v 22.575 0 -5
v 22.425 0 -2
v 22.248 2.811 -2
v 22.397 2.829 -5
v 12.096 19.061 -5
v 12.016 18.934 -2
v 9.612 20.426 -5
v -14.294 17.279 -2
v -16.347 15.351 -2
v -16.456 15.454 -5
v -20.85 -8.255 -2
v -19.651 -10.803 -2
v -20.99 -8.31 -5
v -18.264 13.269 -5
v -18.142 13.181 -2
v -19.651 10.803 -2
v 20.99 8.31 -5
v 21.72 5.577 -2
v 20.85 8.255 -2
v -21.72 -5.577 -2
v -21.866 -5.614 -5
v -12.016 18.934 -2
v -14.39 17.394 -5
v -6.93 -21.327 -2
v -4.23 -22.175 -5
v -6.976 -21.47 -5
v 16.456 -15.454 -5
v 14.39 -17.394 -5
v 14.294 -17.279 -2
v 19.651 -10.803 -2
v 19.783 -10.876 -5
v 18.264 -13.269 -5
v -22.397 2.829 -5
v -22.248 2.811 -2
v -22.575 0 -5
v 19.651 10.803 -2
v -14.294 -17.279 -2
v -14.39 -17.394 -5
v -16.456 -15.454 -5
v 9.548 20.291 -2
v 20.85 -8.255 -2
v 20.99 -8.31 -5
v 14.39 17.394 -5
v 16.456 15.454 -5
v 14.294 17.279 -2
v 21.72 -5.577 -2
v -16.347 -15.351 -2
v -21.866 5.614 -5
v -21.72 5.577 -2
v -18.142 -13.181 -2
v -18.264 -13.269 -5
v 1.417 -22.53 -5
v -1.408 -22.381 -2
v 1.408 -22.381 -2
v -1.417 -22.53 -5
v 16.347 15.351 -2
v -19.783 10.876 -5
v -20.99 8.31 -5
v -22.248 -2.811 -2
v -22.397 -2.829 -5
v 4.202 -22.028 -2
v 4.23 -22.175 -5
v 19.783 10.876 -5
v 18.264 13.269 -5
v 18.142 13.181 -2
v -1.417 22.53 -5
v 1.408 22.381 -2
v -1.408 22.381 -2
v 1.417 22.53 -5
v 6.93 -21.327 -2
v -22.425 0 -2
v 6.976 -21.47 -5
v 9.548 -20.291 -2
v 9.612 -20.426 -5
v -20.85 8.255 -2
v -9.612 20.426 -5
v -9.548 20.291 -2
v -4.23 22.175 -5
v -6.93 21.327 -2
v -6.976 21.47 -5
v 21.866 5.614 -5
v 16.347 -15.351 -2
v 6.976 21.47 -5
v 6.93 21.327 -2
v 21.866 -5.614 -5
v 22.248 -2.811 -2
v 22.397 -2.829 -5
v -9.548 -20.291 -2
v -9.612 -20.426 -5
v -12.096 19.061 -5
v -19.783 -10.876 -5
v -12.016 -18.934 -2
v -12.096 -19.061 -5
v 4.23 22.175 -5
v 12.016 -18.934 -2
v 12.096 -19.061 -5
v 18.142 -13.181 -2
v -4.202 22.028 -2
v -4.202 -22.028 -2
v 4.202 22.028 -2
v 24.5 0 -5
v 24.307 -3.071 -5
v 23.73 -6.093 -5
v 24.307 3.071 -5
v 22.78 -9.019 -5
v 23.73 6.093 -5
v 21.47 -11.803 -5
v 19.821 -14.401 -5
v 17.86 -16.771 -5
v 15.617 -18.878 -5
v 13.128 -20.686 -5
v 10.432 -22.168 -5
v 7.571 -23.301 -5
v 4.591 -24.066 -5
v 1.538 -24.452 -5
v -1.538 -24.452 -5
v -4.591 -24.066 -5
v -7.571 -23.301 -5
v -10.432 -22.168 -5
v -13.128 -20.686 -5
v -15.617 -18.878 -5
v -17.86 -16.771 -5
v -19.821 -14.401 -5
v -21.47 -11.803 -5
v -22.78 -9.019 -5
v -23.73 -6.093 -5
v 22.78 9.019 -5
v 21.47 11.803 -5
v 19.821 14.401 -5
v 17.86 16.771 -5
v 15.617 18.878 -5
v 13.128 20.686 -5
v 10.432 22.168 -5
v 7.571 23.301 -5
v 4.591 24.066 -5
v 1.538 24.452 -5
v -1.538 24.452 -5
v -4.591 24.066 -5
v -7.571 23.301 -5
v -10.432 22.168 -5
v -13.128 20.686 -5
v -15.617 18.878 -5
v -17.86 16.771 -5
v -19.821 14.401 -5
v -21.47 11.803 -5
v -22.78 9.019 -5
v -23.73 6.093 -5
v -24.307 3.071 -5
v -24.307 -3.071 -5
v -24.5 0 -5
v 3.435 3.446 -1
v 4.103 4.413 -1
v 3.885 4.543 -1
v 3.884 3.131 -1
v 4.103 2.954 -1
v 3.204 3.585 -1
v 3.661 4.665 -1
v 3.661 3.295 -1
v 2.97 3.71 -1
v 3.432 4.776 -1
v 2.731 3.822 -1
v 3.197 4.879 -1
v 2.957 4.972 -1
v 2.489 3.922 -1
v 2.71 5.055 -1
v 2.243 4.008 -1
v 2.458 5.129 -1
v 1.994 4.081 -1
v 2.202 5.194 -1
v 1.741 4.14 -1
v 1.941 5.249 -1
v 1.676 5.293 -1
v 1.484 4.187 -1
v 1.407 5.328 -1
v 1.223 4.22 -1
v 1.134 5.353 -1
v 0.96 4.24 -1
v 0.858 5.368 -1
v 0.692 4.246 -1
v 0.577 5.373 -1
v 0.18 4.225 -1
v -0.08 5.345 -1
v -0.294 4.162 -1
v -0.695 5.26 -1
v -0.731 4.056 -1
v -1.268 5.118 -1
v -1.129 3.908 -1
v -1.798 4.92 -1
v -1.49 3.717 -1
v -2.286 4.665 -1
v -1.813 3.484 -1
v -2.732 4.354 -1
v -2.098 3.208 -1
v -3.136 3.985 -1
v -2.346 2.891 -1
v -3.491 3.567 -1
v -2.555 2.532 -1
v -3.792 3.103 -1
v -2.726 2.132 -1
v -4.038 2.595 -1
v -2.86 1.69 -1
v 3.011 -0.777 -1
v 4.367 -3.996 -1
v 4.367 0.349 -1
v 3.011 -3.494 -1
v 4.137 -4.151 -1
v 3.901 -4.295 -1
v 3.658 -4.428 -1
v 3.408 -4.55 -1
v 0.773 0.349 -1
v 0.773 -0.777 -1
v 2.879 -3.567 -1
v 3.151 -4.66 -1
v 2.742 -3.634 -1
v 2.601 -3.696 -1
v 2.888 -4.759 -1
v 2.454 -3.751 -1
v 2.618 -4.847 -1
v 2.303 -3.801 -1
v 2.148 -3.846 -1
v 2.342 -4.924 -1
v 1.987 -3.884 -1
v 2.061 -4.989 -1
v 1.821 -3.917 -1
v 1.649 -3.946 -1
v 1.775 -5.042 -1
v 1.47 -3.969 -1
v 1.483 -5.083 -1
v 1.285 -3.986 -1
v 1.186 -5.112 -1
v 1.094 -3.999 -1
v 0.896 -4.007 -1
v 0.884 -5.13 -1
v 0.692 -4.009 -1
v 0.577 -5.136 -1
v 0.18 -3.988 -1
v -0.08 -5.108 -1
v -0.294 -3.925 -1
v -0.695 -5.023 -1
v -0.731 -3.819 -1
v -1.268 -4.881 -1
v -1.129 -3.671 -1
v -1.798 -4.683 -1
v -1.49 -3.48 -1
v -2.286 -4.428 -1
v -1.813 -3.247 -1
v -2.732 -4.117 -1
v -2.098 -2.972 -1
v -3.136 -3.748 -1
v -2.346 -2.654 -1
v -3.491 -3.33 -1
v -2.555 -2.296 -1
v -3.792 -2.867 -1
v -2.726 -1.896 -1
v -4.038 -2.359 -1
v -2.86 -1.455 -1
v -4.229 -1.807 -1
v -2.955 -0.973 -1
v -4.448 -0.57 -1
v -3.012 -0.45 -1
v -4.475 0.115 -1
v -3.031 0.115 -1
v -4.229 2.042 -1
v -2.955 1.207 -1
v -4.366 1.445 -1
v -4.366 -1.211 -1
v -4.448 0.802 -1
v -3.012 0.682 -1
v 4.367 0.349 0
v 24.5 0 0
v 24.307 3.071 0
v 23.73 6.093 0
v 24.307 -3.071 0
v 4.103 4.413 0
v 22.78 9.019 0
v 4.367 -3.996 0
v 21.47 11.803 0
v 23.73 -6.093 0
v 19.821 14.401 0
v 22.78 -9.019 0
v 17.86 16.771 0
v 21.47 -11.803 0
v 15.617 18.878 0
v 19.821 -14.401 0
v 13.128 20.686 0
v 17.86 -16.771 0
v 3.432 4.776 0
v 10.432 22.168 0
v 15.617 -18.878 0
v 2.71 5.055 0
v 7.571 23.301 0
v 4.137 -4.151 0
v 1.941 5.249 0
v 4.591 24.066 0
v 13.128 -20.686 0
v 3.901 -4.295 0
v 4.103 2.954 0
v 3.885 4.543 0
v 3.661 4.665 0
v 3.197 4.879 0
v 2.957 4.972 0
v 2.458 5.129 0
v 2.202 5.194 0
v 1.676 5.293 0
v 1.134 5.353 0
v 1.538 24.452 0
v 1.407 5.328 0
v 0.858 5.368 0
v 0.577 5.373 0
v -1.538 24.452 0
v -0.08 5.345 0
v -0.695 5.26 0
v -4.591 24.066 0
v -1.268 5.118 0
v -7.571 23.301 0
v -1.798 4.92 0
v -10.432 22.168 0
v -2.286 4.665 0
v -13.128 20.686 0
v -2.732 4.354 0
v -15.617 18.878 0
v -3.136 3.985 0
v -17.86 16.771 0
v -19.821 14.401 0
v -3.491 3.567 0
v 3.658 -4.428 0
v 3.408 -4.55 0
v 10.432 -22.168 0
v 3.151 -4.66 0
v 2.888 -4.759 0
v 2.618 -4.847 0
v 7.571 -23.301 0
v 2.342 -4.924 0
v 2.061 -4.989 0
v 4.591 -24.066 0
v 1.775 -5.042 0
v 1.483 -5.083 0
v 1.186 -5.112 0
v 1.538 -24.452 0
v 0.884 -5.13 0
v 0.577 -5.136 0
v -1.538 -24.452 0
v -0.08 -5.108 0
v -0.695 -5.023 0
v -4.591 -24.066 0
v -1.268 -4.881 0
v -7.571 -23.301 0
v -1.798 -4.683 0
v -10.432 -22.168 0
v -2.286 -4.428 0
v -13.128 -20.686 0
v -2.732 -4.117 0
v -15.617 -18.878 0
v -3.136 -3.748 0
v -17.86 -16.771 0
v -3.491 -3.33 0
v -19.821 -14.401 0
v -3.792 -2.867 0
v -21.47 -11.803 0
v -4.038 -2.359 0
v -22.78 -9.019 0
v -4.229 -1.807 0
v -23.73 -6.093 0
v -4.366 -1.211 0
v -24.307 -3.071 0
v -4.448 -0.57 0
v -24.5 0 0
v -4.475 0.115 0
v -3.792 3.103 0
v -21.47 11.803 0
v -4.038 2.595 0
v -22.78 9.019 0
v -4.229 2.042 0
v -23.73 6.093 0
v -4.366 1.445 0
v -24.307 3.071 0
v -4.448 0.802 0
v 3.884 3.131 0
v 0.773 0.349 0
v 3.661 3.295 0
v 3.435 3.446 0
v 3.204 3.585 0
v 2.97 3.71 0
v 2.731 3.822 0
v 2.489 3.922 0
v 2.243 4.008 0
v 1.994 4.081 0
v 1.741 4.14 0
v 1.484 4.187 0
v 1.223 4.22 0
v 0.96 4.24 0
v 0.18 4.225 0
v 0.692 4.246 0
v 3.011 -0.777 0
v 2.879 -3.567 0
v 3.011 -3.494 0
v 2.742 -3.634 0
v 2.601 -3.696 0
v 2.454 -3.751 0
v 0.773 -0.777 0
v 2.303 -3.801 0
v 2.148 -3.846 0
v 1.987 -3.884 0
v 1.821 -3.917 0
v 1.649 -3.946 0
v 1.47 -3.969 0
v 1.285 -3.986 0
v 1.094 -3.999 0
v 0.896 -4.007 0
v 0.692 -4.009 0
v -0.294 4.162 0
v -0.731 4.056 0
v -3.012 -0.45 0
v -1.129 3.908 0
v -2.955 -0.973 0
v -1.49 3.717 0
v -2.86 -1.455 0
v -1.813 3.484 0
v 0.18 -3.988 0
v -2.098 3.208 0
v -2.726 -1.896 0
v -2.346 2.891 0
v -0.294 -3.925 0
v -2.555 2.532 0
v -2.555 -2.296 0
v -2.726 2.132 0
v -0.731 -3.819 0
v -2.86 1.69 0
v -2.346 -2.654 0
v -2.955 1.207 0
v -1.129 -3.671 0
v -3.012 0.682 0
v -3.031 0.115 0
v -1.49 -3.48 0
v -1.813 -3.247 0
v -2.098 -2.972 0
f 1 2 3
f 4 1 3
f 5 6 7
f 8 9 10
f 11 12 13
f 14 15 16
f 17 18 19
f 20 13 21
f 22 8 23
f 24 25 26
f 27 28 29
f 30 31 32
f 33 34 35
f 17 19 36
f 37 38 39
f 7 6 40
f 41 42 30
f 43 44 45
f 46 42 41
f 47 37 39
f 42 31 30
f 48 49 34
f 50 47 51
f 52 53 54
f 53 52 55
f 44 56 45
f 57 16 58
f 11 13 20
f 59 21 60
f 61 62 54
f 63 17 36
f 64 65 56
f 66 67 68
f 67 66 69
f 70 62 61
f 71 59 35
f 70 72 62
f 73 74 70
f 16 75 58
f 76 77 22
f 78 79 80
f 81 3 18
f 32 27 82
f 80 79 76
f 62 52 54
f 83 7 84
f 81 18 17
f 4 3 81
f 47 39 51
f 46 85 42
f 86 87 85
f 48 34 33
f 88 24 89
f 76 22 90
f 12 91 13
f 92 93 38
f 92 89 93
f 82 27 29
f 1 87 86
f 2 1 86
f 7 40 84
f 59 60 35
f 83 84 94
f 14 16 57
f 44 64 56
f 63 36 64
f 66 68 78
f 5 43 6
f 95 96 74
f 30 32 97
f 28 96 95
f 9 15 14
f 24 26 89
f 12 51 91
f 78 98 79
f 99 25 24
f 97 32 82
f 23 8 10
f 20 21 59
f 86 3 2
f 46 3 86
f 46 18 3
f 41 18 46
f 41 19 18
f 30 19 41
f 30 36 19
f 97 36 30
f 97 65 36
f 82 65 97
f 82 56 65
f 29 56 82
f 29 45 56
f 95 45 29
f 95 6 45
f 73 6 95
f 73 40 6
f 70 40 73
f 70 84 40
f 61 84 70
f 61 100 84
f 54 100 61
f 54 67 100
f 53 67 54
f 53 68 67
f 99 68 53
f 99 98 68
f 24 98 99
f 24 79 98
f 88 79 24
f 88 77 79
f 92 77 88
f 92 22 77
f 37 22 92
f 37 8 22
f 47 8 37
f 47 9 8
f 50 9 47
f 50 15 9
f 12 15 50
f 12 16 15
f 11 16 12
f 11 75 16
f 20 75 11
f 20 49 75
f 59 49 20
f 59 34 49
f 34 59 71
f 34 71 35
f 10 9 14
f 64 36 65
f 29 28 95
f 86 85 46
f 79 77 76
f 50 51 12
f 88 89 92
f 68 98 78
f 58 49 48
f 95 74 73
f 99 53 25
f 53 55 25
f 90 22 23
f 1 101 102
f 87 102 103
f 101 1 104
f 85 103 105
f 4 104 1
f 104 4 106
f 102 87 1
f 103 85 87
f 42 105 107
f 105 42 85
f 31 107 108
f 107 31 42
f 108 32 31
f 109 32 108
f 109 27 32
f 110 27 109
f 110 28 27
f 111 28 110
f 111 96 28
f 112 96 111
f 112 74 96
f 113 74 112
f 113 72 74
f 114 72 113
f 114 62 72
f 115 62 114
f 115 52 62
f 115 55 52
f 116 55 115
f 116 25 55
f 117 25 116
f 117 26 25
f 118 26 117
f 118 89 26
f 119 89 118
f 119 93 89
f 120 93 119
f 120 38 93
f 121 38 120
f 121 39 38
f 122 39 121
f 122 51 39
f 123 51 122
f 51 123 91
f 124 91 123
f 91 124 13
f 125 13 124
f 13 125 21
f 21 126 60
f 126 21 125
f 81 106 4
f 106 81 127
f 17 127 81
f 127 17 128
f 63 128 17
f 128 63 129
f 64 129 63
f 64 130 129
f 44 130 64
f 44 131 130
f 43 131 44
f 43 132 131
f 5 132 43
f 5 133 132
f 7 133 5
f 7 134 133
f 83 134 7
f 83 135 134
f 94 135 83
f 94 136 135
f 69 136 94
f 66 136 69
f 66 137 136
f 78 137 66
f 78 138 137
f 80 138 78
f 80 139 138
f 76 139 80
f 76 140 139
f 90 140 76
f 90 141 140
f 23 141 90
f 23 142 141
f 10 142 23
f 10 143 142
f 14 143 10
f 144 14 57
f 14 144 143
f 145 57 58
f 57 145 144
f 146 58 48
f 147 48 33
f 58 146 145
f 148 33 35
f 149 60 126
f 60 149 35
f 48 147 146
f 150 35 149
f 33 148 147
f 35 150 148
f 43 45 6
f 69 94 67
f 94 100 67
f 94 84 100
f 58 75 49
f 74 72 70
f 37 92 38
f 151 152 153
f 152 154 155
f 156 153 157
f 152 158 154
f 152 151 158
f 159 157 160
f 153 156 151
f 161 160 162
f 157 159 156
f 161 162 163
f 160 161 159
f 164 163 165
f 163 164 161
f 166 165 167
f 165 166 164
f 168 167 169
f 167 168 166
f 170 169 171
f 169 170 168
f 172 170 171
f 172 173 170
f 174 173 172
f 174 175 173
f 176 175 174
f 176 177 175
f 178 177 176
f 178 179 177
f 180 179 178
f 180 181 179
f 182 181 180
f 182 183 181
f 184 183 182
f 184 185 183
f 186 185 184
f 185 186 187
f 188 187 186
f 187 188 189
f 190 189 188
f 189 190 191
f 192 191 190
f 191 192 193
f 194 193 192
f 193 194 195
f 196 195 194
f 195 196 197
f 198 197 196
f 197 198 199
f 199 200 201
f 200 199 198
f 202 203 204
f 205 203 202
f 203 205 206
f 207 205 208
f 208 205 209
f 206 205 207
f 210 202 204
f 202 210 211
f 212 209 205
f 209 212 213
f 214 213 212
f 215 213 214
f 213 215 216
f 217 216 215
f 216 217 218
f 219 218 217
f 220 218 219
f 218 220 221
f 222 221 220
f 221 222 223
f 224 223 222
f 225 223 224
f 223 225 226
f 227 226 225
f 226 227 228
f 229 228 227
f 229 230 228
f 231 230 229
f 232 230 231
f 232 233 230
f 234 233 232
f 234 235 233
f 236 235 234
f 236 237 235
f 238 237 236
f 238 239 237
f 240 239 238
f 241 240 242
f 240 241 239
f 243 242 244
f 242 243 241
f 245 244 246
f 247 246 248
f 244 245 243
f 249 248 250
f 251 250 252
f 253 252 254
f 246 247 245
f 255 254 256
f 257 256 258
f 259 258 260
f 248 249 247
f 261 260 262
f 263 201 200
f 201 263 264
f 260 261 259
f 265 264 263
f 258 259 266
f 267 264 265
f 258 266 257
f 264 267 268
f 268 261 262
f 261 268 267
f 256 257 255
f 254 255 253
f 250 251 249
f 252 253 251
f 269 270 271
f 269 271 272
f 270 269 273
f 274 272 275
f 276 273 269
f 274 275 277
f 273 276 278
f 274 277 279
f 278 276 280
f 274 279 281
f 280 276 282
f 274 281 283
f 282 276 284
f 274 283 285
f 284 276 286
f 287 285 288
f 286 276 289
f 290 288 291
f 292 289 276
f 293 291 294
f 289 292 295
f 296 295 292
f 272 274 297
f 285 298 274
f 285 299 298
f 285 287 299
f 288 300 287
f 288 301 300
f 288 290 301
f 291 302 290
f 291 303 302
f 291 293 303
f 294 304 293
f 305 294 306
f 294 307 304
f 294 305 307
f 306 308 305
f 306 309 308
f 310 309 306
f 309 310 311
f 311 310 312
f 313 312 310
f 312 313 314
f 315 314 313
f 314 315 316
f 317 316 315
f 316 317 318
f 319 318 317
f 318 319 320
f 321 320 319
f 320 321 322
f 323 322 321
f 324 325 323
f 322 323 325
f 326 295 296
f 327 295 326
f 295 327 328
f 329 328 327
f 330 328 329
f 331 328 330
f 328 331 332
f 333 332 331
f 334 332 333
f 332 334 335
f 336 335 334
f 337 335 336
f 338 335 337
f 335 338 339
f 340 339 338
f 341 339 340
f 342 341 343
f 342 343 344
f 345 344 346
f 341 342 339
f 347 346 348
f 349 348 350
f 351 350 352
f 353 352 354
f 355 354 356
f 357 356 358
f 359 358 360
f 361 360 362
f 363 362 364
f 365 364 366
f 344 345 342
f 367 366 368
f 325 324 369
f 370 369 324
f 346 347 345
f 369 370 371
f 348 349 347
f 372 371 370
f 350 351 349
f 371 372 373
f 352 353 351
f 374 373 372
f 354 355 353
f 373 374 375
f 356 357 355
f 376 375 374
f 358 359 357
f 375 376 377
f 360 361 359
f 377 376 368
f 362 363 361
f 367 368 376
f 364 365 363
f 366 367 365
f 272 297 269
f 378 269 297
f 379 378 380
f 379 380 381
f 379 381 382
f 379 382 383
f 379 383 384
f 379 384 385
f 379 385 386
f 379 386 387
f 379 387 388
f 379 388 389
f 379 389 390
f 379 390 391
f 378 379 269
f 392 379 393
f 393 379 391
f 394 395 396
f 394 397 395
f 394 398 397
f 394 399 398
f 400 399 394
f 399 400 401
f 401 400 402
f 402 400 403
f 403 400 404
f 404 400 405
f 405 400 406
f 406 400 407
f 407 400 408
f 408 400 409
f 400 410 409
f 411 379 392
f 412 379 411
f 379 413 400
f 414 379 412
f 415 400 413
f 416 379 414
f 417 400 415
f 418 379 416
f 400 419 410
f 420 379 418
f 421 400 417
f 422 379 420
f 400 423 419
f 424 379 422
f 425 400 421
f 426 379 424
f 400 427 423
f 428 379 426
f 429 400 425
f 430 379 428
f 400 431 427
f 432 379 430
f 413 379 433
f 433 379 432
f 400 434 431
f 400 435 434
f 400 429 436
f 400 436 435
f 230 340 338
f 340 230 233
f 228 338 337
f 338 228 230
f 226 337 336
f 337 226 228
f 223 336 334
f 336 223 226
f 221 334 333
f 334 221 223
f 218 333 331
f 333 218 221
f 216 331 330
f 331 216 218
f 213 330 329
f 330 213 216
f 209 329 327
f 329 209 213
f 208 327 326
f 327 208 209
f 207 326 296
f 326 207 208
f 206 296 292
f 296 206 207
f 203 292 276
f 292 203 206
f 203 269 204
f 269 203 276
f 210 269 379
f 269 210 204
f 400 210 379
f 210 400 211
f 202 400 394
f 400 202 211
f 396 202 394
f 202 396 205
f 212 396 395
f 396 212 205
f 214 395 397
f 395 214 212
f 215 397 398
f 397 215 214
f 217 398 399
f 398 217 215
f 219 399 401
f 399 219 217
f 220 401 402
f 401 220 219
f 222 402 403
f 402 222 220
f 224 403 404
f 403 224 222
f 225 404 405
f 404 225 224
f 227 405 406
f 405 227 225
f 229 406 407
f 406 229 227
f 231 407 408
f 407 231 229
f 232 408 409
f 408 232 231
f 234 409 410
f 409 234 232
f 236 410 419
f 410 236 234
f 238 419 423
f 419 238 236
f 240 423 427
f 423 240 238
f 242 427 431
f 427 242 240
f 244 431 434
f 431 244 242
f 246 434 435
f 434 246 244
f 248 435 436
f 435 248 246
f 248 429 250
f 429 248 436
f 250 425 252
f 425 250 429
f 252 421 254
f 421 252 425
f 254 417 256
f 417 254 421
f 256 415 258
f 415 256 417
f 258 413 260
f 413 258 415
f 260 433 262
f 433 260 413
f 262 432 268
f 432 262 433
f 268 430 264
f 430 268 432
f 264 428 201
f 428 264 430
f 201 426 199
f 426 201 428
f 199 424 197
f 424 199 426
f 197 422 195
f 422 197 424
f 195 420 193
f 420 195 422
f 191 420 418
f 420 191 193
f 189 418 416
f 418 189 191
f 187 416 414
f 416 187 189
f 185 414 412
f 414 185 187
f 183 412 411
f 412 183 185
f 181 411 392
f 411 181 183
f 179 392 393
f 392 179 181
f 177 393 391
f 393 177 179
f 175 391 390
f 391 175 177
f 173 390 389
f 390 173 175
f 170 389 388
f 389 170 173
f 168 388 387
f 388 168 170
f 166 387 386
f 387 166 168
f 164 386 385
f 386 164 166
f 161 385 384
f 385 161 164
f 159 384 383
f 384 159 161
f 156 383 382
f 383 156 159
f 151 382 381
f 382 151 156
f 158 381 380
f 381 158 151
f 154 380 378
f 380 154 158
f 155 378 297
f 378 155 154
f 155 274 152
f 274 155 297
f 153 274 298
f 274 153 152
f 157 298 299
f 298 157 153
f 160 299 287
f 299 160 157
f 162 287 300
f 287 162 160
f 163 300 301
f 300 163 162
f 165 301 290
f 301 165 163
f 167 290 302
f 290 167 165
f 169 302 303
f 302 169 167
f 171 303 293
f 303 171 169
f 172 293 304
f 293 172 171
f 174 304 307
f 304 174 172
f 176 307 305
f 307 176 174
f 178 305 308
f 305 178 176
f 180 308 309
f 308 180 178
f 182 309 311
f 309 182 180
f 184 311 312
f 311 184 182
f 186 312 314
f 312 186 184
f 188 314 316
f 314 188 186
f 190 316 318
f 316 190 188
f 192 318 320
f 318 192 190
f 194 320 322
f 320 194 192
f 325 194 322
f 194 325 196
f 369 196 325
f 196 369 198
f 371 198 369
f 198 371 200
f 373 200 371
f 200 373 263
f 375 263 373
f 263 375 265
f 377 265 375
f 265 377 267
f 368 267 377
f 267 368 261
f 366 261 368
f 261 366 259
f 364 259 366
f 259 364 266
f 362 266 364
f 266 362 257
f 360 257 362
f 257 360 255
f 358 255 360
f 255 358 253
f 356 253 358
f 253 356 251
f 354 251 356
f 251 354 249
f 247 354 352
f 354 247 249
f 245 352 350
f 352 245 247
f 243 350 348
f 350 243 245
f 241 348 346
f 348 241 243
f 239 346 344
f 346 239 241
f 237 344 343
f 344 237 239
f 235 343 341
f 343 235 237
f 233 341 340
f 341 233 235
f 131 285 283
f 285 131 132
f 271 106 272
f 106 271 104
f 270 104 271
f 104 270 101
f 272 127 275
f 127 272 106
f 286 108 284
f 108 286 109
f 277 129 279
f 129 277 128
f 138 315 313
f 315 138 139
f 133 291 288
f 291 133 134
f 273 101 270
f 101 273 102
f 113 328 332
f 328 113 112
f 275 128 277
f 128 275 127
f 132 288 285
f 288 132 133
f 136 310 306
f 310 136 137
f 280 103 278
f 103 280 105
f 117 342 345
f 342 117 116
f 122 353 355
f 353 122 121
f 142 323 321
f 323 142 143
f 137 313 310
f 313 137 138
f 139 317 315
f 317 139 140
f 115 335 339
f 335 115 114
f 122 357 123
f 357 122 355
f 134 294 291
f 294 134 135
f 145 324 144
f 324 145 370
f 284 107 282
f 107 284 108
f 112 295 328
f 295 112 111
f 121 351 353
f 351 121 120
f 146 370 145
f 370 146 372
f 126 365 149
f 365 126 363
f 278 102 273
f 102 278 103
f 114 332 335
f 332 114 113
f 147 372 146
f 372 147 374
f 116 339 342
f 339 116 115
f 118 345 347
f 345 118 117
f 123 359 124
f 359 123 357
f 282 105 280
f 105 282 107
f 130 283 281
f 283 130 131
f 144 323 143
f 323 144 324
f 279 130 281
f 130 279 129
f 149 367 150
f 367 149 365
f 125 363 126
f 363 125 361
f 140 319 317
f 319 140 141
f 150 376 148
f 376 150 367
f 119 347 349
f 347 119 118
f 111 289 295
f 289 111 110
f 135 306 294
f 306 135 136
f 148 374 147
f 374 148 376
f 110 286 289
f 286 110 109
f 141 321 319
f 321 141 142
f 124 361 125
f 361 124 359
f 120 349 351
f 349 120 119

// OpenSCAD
$fn = 50;

difference() {
	union() {
		translate(v = [0, 0, -5.0]) {
			cylinder(h = 5, r = 24.5);
		}
	}
	union() {
		#translate(v = [0, 0, -5.0]) {
			cylinder(h = 3, r1 = 22.575, r2 = 22.425);
		}
		translate(v = [0, 0, -1]) {
			linear_extrude(height = 1) {
				text(font = "Impact", halign = "center", size = 10, text = "G", valign = "center");
			}
		}
	}
}
